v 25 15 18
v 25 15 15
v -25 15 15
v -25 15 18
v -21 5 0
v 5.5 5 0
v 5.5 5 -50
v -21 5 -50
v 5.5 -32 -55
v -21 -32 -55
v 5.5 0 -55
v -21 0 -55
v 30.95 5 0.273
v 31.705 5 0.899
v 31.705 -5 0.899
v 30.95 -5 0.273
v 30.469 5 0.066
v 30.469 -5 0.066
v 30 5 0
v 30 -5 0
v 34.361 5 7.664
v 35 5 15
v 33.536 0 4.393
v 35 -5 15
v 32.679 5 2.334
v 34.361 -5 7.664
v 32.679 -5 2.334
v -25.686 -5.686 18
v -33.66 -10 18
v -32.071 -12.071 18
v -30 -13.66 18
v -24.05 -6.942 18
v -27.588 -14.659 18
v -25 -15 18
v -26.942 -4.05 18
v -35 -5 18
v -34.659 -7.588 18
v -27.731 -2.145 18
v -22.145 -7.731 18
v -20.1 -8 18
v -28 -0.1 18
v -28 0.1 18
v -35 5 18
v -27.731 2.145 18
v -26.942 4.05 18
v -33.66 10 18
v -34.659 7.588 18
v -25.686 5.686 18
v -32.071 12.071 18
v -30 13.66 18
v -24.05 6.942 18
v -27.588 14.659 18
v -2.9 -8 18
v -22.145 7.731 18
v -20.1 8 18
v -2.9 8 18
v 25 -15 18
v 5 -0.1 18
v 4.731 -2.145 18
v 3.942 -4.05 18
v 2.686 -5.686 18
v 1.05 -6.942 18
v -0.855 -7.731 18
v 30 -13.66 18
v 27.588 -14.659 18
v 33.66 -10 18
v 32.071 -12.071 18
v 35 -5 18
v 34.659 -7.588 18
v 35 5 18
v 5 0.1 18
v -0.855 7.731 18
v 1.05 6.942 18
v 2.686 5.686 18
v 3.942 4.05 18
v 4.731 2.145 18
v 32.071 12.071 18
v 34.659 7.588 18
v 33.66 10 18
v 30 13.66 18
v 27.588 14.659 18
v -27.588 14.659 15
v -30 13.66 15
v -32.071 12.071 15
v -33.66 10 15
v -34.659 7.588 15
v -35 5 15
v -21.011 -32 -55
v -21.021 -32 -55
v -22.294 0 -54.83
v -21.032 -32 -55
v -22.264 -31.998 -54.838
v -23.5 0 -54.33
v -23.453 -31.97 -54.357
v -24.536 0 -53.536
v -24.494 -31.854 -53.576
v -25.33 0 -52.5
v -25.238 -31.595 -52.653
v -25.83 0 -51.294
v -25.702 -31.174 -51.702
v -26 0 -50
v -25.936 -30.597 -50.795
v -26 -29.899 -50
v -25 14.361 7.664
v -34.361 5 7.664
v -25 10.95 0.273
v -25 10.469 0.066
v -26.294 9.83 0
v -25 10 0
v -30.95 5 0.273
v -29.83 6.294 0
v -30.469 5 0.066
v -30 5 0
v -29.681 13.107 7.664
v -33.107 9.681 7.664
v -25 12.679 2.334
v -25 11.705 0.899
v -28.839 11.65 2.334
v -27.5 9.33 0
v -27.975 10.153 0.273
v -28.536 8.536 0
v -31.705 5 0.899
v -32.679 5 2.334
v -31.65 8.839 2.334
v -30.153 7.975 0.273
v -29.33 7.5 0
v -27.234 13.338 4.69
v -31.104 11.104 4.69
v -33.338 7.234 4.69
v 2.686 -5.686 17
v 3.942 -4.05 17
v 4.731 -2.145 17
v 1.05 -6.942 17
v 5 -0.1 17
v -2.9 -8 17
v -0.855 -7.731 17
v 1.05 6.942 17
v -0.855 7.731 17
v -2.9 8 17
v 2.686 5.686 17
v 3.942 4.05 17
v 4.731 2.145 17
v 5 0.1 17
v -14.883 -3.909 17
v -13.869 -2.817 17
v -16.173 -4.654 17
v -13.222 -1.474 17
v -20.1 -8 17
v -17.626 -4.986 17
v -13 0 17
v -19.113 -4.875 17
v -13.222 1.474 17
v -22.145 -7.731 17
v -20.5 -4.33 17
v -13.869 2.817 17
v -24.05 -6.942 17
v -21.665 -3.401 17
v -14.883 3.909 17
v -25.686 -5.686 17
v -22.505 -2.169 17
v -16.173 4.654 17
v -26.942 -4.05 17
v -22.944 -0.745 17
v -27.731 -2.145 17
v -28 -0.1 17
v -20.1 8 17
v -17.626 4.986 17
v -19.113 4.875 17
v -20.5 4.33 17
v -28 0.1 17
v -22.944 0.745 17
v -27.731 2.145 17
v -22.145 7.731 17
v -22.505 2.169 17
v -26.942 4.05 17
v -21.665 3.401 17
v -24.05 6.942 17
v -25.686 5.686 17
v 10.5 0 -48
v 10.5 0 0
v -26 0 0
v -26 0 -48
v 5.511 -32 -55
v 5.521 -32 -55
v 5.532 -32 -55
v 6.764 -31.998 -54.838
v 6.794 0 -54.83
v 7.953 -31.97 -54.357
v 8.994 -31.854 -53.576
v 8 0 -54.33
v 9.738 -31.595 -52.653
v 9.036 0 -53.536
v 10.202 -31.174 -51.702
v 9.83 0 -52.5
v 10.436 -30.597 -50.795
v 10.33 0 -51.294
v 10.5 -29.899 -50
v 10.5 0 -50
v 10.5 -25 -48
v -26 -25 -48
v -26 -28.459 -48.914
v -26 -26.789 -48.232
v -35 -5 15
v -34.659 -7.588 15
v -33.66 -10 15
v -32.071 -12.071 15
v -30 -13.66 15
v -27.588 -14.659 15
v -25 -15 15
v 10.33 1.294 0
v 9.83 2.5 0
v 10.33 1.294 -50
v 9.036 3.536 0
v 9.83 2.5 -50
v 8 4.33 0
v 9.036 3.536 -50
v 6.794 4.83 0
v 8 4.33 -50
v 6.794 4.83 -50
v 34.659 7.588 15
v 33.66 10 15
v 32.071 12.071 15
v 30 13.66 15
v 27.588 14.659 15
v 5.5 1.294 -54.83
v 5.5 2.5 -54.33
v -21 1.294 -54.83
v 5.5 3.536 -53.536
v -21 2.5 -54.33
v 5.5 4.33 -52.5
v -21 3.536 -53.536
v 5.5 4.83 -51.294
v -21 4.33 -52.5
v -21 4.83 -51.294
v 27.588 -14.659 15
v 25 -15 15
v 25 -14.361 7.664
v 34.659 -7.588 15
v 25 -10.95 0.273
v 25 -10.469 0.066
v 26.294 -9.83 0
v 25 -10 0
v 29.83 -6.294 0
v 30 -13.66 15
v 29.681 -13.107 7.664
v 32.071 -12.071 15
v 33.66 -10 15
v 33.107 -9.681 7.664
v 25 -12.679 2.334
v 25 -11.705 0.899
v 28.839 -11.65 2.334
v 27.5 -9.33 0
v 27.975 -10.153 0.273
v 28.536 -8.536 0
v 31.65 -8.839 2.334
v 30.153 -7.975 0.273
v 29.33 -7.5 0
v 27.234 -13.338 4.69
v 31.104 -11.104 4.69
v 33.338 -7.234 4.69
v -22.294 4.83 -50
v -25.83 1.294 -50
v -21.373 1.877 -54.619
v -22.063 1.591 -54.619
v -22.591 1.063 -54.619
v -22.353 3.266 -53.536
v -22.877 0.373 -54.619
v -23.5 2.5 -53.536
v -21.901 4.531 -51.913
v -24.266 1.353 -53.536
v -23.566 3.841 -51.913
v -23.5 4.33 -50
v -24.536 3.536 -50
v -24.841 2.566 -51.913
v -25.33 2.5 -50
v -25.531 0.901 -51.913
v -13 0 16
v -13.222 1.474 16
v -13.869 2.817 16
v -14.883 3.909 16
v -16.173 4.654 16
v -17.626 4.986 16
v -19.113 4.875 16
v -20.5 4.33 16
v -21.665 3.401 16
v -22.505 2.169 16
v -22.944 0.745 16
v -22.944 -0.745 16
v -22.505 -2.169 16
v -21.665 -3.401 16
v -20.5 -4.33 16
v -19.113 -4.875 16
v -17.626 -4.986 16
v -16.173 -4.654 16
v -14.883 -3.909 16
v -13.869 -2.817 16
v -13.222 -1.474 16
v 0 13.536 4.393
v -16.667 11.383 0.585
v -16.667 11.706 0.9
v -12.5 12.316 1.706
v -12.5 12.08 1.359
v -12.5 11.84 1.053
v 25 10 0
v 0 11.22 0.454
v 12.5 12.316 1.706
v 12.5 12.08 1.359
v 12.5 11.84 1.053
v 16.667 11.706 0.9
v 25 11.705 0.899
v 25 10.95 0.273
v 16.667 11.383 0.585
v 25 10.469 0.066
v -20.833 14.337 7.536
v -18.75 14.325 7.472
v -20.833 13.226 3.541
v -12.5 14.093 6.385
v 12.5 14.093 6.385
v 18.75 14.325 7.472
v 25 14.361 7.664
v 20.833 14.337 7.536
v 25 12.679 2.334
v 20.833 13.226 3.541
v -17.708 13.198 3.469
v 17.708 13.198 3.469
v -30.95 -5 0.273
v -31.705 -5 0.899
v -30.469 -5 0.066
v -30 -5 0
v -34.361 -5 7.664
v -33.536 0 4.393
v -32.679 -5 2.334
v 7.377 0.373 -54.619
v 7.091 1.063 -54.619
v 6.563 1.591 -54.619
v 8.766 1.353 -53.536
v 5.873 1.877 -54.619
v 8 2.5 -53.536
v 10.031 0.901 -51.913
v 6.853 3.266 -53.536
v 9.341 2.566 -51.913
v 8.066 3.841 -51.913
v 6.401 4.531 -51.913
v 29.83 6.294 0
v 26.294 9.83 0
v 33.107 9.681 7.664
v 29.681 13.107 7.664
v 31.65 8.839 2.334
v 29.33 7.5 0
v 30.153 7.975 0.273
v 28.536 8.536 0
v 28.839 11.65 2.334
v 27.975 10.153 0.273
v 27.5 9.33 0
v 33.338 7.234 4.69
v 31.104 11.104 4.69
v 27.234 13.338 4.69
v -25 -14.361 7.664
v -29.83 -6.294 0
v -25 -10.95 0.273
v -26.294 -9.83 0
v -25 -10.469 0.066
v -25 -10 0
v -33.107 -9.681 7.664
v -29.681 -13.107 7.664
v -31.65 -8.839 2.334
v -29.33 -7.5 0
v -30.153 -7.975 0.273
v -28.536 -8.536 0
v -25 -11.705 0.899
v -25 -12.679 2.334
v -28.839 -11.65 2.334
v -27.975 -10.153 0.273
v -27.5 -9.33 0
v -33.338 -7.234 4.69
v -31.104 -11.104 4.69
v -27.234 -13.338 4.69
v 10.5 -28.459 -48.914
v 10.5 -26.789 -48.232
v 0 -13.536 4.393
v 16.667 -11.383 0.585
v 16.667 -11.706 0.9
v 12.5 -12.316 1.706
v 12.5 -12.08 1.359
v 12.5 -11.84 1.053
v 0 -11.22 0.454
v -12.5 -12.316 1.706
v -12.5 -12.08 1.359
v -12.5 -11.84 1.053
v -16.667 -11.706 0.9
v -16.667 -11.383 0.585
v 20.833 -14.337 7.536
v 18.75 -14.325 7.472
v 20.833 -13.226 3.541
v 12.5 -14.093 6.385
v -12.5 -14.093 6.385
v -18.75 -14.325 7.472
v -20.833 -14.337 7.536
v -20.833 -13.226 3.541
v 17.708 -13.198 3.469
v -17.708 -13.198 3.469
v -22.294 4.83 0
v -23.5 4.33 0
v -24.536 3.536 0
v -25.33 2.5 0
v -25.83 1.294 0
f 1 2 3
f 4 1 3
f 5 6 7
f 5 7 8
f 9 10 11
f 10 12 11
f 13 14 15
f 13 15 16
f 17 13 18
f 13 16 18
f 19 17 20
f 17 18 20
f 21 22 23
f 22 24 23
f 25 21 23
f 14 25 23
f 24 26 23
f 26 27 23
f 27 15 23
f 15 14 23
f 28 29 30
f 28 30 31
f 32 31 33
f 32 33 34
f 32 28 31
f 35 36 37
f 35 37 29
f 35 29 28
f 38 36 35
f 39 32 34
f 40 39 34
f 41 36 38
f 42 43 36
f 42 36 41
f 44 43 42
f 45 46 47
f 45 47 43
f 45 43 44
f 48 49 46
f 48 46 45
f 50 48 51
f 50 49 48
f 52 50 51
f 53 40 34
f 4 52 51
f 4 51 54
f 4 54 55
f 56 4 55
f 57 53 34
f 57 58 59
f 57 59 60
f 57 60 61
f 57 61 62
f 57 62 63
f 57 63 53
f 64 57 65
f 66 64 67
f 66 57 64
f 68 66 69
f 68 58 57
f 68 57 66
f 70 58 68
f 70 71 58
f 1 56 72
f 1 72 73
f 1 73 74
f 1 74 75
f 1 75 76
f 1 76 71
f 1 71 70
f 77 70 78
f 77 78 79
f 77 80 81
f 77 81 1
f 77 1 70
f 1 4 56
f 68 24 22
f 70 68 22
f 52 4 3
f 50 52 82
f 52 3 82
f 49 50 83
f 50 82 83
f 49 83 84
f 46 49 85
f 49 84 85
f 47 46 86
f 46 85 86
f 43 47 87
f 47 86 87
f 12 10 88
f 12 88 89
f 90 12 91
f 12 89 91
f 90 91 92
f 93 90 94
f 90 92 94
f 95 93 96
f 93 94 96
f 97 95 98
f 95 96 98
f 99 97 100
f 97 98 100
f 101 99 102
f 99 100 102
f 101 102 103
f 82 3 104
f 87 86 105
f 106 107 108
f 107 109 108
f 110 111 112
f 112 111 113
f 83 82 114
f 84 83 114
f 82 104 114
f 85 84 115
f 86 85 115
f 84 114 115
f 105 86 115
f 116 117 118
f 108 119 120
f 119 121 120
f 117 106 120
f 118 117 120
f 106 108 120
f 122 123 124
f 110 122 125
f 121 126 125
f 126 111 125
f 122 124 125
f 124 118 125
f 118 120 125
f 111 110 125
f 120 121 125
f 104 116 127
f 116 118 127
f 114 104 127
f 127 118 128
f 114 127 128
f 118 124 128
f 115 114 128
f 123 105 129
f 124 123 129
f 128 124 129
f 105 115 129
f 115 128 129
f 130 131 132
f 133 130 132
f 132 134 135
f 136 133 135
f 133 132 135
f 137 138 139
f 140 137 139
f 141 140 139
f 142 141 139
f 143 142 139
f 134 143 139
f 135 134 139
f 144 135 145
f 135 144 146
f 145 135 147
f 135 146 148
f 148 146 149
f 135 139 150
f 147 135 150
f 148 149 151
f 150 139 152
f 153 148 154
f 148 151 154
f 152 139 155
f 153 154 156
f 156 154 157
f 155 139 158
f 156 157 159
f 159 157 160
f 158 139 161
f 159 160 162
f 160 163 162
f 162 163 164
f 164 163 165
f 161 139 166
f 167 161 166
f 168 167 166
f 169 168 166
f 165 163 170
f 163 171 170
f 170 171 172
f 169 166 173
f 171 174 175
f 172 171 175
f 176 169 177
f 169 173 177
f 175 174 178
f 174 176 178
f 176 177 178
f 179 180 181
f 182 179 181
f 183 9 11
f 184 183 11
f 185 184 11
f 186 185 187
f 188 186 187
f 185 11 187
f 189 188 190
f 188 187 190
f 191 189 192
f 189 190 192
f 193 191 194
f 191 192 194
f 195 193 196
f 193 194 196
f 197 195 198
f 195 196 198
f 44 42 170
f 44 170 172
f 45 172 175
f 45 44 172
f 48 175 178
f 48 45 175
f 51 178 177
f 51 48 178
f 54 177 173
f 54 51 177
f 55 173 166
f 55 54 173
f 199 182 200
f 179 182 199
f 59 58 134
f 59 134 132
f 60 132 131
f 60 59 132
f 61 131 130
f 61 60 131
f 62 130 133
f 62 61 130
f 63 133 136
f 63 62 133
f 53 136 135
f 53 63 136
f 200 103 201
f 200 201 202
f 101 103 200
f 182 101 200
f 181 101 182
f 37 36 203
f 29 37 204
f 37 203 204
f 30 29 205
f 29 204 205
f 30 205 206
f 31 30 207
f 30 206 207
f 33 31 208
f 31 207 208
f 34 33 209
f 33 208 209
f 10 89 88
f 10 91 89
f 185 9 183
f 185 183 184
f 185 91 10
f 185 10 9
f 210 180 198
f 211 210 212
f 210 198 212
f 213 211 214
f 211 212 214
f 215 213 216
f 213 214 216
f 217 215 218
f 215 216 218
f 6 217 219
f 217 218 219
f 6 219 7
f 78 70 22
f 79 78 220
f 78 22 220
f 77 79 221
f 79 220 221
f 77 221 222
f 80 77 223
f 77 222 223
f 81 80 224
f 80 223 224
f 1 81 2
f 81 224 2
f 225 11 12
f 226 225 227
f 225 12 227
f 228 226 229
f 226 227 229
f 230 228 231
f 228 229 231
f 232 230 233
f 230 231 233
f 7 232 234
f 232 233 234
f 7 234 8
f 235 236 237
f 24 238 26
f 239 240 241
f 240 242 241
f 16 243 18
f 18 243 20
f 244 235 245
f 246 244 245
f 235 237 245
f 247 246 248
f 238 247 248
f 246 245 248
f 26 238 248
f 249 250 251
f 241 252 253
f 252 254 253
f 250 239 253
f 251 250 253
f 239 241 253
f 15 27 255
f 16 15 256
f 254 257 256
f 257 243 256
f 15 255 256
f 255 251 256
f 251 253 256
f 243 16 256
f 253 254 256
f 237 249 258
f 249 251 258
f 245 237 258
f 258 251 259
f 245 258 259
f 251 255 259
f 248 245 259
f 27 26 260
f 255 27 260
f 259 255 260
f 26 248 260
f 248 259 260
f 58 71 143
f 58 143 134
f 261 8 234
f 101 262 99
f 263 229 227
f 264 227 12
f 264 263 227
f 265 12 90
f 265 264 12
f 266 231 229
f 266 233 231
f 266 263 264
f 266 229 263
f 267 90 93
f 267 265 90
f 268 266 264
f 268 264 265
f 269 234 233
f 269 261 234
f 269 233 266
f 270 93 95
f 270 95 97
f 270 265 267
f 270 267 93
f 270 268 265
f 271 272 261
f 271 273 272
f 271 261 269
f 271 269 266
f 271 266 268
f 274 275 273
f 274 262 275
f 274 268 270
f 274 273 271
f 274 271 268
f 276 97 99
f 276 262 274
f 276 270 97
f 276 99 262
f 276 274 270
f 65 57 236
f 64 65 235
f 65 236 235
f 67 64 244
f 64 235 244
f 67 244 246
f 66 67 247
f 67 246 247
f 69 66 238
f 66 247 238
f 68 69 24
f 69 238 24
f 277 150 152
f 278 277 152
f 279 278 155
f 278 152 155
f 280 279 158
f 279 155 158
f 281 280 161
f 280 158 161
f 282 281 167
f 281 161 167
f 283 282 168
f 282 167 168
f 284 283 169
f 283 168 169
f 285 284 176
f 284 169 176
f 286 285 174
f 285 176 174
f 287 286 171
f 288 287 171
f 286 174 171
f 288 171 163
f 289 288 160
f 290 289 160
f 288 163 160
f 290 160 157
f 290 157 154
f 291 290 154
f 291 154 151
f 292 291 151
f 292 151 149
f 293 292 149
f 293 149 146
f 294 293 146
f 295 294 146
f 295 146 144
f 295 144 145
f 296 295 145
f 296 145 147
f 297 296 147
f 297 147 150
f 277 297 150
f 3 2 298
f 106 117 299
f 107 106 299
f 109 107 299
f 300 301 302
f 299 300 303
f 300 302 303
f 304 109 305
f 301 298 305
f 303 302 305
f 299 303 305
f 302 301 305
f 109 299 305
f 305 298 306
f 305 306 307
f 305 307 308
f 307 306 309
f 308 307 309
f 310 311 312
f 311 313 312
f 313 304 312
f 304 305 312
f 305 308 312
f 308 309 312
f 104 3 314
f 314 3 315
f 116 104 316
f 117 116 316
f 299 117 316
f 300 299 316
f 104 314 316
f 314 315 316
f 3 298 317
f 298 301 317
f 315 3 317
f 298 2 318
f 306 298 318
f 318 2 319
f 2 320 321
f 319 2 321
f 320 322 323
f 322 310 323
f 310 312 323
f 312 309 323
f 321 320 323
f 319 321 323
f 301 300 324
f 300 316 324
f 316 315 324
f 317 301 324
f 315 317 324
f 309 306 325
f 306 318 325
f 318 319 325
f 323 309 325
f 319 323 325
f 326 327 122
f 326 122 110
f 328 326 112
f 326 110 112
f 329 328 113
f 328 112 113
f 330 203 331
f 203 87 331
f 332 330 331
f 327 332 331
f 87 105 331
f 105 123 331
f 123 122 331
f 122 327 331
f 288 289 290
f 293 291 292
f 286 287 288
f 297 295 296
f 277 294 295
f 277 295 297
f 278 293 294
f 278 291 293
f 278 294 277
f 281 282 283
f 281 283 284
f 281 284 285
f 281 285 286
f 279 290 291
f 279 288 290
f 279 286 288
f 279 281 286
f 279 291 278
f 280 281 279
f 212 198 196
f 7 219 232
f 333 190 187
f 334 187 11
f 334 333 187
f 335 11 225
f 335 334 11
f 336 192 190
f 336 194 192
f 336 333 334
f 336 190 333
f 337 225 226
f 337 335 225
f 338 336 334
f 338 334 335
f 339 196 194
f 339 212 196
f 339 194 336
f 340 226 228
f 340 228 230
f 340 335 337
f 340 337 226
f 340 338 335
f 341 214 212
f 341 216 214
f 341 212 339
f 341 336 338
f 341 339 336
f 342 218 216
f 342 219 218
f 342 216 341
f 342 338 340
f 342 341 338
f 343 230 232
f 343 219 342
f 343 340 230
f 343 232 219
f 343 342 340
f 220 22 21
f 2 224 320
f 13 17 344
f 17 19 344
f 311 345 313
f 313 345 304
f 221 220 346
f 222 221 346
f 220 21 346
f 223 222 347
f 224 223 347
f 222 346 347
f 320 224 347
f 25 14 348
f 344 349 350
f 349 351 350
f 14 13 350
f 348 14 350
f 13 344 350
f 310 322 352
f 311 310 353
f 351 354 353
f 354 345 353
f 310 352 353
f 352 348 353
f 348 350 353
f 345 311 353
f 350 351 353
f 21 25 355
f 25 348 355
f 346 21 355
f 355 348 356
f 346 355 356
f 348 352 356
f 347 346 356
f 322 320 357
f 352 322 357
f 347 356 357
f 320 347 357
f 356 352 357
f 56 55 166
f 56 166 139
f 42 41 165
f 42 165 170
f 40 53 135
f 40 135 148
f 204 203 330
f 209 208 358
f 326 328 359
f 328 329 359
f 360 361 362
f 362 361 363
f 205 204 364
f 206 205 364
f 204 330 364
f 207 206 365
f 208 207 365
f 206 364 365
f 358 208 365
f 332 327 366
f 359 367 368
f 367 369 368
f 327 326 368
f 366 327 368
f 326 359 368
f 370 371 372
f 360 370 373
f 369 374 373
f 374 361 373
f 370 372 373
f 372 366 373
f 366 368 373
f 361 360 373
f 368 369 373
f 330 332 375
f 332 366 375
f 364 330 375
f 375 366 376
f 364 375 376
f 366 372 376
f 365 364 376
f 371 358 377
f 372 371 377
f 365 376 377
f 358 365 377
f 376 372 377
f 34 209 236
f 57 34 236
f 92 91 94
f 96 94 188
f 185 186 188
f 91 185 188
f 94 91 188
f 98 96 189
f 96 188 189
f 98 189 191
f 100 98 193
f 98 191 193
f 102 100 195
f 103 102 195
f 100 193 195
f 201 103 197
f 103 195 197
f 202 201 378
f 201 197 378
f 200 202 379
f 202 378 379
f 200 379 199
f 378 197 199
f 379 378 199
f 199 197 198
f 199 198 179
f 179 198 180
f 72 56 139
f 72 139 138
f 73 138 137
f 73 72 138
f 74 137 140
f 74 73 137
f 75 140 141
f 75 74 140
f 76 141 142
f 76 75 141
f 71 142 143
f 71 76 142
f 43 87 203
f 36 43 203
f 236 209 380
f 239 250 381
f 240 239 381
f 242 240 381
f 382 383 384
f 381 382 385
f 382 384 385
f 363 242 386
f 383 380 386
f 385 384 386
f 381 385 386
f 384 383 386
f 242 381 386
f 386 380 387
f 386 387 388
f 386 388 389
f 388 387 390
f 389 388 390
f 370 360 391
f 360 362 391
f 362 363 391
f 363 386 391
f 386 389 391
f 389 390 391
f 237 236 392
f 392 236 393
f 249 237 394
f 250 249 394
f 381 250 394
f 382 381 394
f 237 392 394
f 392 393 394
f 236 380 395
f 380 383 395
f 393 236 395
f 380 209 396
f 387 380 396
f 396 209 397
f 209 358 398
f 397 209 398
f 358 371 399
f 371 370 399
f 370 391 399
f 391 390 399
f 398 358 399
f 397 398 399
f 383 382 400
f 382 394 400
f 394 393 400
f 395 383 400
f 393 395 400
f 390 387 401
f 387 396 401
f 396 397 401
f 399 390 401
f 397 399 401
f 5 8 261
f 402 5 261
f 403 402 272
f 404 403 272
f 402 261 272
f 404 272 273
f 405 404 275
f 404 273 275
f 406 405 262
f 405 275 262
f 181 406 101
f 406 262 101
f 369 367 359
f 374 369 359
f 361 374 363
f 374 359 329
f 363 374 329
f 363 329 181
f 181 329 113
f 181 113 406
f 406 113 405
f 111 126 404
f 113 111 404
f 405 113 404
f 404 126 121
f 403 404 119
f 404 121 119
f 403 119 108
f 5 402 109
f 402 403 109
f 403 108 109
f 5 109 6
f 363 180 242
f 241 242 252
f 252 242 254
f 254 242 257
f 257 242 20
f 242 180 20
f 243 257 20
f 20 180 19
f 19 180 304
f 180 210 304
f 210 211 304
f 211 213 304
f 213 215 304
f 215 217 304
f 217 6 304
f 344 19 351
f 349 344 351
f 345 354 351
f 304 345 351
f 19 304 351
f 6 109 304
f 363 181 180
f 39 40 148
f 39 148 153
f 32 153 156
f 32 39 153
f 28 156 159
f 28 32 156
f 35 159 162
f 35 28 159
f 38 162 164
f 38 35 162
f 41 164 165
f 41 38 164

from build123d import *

# Parameters (mm, degrees)
RESSALTO_EXTRUS_O1_DEPTH = 18
FILETE1_SIZE             = 15
FILETE1_SIZE_2           = 5
ESBO_O2_R                = 5
CORTE_EXTRUS_O1_DEPTH    = 2
CORTE_EXTRUS_O2_DEPTH    = 1
ESBO_O4_W                = 36.5
ESBO_O4_H                = 5
RESSALTO_EXTRUS_O2_DEPTH = 55
FILETE2_R                = 5
ESBO_O5_W                = 36.5
ESBO_O5_H                = 7
RESSALTO_EXTRUS_O3_DEPTH = 32
FILETE3_R                = 5
FILETE4_R                = 7


# Some blends are built 0.0001 mm under size
with BuildPart() as part:
    # Esboço1 → Ressalto-extrusão1 (new body)
    with BuildSketch(Plane.XY):
        with BuildLine():
            Line((-25, -15), (25, -15))
            ThreePointArc((25, -15), (32.071067812, -12.071067812), (35, -5))
            Line((35, -5), (35, 5))
            ThreePointArc((35, 5), (32.071067812, 12.071067812), (25, 15))
            Line((25, 15), (-25, 15))
            ThreePointArc((-25, 15), (-32.071067812, 12.071067812), (-35, 5))
            Line((-35, 5), (-35, -5))
            ThreePointArc((-35, -5), (-32.071067812, -12.071067812), (-25, -15))
        make_face()
    extrude(amount=RESSALTO_EXTRUS_O1_DEPTH)

    # Filete1
    # an asymmetric fillet: 15, 5 mm, written as the material it takes off along each edge
    with BuildSketch(Plane(origin=(25, 15, 0), x_dir=(0, 0, 1), z_dir=(-1, 0, 0)), Plane(origin=(-25, -15, 0), x_dir=(0, 0, 1), z_dir=(1, 0, 0))) as filete1_piece_1:
        with BuildLine():
            Bezier((FILETE1_SIZE, 0), (0, 0), (0, -FILETE1_SIZE_2), weights=[1, 0.707106781, 1])
            Line((0, -FILETE1_SIZE_2), (0, 0))
            Line((0, 0), (FILETE1_SIZE, 0))
        make_face()
    extrude(amount=50, mode=Mode.SUBTRACT)
    with BuildSketch(Plane(origin=(25, 5, 0), x_dir=(1, 0, 0), z_dir=(0, -1, 0))) as filete1_piece_2:
        with BuildLine():
            Bezier((10, FILETE1_SIZE), (10, 0), (10 - FILETE1_SIZE_2, 0), weights=[1, 0.707106781, 1])
            Line((10 - FILETE1_SIZE_2, 0), (10, 0))
            Line((10, 0), (10, FILETE1_SIZE))
        make_face()
    revolve(axis=Axis((25, 5, 0), (0, 0, 1)), revolution_arc=90, mode=Mode.SUBTRACT)
    with BuildSketch(Plane(origin=(35, -5, 0), x_dir=(0, 0, 1), z_dir=(0, 1, 0)), Plane(origin=(-35, 5, 0), x_dir=(0, 0, 1), z_dir=(0, -1, 0))) as filete1_piece_3:
        with BuildLine():
            Bezier((FILETE1_SIZE, 0), (0, 0), (0, -FILETE1_SIZE_2), weights=[1, 0.707106781, 1])
            Line((0, -FILETE1_SIZE_2), (0, 0))
            Line((0, 0), (FILETE1_SIZE, 0))
        make_face()
    extrude(amount=10, mode=Mode.SUBTRACT)
    with BuildSketch(Plane(origin=(25, -5, 0), x_dir=(0, -1, 0), z_dir=(-1, 0, 0))) as filete1_piece_4:
        with BuildLine():
            Bezier((10, FILETE1_SIZE), (10, 0), (10 - FILETE1_SIZE_2, 0), weights=[1, 0.707106781, 1])
            Line((10 - FILETE1_SIZE_2, 0), (10, 0))
            Line((10, 0), (10, FILETE1_SIZE))
        make_face()
    revolve(axis=Axis((25, -5, 0), (0, 0, 1)), revolution_arc=90, mode=Mode.SUBTRACT)
    with BuildSketch(Plane(origin=(-25, -5, 0), x_dir=(-1, 0, 0), z_dir=(0, 1, 0))) as filete1_piece_5:
        with BuildLine():
            Bezier((10, FILETE1_SIZE), (10, 0), (10 - FILETE1_SIZE_2, 0), weights=[1, 0.707106781, 1])
            Line((10 - FILETE1_SIZE_2, 0), (10, 0))
            Line((10, 0), (10, FILETE1_SIZE))
        make_face()
    revolve(axis=Axis((-25, -5, 0), (0, 0, 1)), revolution_arc=90, mode=Mode.SUBTRACT)
    with BuildSketch(Plane(origin=(-25, 5, 0), x_dir=(0, 1, 0), z_dir=(1, 0, 0))) as filete1_piece_6:
        with BuildLine():
            Bezier((10, FILETE1_SIZE), (10, 0), (10 - FILETE1_SIZE_2, 0), weights=[1, 0.707106781, 1])
            Line((10 - FILETE1_SIZE_2, 0), (10, 0))
            Line((10, 0), (10, FILETE1_SIZE))
        make_face()
    revolve(axis=Axis((-25, 5, 0), (0, 0, 1)), revolution_arc=90, mode=Mode.SUBTRACT)

    # Esboço2 → Corte-extrusão1 (cut)
    with BuildSketch(Plane.XY.offset(18)):
        with Locations((-18, 0)):
            Circle(ESBO_O2_R)
    extrude(amount=-CORTE_EXTRUS_O1_DEPTH, mode=Mode.SUBTRACT)

    # Esboço3 → Corte-extrusão2 (cut)
    with BuildSketch(Plane.XY.offset(18)):
        with BuildLine():
            Line((-2.9, -8), (-20.1, -8))
            ThreePointArc((-20.1, -8), (-25.686143571, -5.686143571), (-28, -0.1))
            Line((-28, -0.1), (-28, 0.1))
            ThreePointArc((-28, 0.1), (-25.686143571, 5.686143571), (-20.1, 8))
            Line((-20.1, 8), (-2.9, 8))
            ThreePointArc((-2.9, 8), (2.686143571, 5.686143571), (5, 0.1))
            Line((5, 0.1), (5, -0.1))
            ThreePointArc((5, -0.1), (2.686143571, -5.686143571), (-2.9, -8))
        make_face()
    extrude(amount=-CORTE_EXTRUS_O2_DEPTH, mode=Mode.SUBTRACT)

    # Esboço4 → Ressalto-extrusão2 (add)
    with BuildSketch(Plane(origin=(0, 0, 0), x_dir=(-1, 0, 0), z_dir=(0, 0, -1))):
        with Locations((7.75, 2.5)):
            Rectangle(ESBO_O4_W, ESBO_O4_H)
    extrude(amount=RESSALTO_EXTRUS_O2_DEPTH)

    # Filete2
    filete2_edges = [part.edges().sort_by_distance(p)[0] for p in [
        (-26, 5, -27.5),
        (10.5, 5, -27.5),
    ]]
    fillet(filete2_edges, radius=FILETE2_R - 0.0001)  # a hair under: the kernel refuses the full size

    # Esboço5 → Ressalto-extrusão3 (add)
    with BuildSketch(Plane.XZ):
        with Locations((-7.75, -51.5)):
            Rectangle(ESBO_O5_W, ESBO_O5_H)
    extrude(amount=RESSALTO_EXTRUS_O3_DEPTH)

    # Filete3
    filete3_edges = [part.edges().sort_by_distance(p)[0] for p in [
        (-7.75, 5, -55),
        (9.035563195, 3.535563195, -55),
        (-24.535563195, 3.535563195, -55),
        (-26, -15.99995, -55),
        (10.5, -15.99995, -55),
    ]]
    fillet(filete3_edges, radius=FILETE3_R - 0.0001)  # a hair under: the kernel refuses the full size

    # Filete4
    filete4_edges = [part.edges().sort_by_distance(p)[0] for p in [
        (-7.75, -32, -48),
    ]]
    fillet(filete4_edges, radius=FILETE4_R - 0.0001)  # a hair under: the kernel refuses the full size


solid = part.part
